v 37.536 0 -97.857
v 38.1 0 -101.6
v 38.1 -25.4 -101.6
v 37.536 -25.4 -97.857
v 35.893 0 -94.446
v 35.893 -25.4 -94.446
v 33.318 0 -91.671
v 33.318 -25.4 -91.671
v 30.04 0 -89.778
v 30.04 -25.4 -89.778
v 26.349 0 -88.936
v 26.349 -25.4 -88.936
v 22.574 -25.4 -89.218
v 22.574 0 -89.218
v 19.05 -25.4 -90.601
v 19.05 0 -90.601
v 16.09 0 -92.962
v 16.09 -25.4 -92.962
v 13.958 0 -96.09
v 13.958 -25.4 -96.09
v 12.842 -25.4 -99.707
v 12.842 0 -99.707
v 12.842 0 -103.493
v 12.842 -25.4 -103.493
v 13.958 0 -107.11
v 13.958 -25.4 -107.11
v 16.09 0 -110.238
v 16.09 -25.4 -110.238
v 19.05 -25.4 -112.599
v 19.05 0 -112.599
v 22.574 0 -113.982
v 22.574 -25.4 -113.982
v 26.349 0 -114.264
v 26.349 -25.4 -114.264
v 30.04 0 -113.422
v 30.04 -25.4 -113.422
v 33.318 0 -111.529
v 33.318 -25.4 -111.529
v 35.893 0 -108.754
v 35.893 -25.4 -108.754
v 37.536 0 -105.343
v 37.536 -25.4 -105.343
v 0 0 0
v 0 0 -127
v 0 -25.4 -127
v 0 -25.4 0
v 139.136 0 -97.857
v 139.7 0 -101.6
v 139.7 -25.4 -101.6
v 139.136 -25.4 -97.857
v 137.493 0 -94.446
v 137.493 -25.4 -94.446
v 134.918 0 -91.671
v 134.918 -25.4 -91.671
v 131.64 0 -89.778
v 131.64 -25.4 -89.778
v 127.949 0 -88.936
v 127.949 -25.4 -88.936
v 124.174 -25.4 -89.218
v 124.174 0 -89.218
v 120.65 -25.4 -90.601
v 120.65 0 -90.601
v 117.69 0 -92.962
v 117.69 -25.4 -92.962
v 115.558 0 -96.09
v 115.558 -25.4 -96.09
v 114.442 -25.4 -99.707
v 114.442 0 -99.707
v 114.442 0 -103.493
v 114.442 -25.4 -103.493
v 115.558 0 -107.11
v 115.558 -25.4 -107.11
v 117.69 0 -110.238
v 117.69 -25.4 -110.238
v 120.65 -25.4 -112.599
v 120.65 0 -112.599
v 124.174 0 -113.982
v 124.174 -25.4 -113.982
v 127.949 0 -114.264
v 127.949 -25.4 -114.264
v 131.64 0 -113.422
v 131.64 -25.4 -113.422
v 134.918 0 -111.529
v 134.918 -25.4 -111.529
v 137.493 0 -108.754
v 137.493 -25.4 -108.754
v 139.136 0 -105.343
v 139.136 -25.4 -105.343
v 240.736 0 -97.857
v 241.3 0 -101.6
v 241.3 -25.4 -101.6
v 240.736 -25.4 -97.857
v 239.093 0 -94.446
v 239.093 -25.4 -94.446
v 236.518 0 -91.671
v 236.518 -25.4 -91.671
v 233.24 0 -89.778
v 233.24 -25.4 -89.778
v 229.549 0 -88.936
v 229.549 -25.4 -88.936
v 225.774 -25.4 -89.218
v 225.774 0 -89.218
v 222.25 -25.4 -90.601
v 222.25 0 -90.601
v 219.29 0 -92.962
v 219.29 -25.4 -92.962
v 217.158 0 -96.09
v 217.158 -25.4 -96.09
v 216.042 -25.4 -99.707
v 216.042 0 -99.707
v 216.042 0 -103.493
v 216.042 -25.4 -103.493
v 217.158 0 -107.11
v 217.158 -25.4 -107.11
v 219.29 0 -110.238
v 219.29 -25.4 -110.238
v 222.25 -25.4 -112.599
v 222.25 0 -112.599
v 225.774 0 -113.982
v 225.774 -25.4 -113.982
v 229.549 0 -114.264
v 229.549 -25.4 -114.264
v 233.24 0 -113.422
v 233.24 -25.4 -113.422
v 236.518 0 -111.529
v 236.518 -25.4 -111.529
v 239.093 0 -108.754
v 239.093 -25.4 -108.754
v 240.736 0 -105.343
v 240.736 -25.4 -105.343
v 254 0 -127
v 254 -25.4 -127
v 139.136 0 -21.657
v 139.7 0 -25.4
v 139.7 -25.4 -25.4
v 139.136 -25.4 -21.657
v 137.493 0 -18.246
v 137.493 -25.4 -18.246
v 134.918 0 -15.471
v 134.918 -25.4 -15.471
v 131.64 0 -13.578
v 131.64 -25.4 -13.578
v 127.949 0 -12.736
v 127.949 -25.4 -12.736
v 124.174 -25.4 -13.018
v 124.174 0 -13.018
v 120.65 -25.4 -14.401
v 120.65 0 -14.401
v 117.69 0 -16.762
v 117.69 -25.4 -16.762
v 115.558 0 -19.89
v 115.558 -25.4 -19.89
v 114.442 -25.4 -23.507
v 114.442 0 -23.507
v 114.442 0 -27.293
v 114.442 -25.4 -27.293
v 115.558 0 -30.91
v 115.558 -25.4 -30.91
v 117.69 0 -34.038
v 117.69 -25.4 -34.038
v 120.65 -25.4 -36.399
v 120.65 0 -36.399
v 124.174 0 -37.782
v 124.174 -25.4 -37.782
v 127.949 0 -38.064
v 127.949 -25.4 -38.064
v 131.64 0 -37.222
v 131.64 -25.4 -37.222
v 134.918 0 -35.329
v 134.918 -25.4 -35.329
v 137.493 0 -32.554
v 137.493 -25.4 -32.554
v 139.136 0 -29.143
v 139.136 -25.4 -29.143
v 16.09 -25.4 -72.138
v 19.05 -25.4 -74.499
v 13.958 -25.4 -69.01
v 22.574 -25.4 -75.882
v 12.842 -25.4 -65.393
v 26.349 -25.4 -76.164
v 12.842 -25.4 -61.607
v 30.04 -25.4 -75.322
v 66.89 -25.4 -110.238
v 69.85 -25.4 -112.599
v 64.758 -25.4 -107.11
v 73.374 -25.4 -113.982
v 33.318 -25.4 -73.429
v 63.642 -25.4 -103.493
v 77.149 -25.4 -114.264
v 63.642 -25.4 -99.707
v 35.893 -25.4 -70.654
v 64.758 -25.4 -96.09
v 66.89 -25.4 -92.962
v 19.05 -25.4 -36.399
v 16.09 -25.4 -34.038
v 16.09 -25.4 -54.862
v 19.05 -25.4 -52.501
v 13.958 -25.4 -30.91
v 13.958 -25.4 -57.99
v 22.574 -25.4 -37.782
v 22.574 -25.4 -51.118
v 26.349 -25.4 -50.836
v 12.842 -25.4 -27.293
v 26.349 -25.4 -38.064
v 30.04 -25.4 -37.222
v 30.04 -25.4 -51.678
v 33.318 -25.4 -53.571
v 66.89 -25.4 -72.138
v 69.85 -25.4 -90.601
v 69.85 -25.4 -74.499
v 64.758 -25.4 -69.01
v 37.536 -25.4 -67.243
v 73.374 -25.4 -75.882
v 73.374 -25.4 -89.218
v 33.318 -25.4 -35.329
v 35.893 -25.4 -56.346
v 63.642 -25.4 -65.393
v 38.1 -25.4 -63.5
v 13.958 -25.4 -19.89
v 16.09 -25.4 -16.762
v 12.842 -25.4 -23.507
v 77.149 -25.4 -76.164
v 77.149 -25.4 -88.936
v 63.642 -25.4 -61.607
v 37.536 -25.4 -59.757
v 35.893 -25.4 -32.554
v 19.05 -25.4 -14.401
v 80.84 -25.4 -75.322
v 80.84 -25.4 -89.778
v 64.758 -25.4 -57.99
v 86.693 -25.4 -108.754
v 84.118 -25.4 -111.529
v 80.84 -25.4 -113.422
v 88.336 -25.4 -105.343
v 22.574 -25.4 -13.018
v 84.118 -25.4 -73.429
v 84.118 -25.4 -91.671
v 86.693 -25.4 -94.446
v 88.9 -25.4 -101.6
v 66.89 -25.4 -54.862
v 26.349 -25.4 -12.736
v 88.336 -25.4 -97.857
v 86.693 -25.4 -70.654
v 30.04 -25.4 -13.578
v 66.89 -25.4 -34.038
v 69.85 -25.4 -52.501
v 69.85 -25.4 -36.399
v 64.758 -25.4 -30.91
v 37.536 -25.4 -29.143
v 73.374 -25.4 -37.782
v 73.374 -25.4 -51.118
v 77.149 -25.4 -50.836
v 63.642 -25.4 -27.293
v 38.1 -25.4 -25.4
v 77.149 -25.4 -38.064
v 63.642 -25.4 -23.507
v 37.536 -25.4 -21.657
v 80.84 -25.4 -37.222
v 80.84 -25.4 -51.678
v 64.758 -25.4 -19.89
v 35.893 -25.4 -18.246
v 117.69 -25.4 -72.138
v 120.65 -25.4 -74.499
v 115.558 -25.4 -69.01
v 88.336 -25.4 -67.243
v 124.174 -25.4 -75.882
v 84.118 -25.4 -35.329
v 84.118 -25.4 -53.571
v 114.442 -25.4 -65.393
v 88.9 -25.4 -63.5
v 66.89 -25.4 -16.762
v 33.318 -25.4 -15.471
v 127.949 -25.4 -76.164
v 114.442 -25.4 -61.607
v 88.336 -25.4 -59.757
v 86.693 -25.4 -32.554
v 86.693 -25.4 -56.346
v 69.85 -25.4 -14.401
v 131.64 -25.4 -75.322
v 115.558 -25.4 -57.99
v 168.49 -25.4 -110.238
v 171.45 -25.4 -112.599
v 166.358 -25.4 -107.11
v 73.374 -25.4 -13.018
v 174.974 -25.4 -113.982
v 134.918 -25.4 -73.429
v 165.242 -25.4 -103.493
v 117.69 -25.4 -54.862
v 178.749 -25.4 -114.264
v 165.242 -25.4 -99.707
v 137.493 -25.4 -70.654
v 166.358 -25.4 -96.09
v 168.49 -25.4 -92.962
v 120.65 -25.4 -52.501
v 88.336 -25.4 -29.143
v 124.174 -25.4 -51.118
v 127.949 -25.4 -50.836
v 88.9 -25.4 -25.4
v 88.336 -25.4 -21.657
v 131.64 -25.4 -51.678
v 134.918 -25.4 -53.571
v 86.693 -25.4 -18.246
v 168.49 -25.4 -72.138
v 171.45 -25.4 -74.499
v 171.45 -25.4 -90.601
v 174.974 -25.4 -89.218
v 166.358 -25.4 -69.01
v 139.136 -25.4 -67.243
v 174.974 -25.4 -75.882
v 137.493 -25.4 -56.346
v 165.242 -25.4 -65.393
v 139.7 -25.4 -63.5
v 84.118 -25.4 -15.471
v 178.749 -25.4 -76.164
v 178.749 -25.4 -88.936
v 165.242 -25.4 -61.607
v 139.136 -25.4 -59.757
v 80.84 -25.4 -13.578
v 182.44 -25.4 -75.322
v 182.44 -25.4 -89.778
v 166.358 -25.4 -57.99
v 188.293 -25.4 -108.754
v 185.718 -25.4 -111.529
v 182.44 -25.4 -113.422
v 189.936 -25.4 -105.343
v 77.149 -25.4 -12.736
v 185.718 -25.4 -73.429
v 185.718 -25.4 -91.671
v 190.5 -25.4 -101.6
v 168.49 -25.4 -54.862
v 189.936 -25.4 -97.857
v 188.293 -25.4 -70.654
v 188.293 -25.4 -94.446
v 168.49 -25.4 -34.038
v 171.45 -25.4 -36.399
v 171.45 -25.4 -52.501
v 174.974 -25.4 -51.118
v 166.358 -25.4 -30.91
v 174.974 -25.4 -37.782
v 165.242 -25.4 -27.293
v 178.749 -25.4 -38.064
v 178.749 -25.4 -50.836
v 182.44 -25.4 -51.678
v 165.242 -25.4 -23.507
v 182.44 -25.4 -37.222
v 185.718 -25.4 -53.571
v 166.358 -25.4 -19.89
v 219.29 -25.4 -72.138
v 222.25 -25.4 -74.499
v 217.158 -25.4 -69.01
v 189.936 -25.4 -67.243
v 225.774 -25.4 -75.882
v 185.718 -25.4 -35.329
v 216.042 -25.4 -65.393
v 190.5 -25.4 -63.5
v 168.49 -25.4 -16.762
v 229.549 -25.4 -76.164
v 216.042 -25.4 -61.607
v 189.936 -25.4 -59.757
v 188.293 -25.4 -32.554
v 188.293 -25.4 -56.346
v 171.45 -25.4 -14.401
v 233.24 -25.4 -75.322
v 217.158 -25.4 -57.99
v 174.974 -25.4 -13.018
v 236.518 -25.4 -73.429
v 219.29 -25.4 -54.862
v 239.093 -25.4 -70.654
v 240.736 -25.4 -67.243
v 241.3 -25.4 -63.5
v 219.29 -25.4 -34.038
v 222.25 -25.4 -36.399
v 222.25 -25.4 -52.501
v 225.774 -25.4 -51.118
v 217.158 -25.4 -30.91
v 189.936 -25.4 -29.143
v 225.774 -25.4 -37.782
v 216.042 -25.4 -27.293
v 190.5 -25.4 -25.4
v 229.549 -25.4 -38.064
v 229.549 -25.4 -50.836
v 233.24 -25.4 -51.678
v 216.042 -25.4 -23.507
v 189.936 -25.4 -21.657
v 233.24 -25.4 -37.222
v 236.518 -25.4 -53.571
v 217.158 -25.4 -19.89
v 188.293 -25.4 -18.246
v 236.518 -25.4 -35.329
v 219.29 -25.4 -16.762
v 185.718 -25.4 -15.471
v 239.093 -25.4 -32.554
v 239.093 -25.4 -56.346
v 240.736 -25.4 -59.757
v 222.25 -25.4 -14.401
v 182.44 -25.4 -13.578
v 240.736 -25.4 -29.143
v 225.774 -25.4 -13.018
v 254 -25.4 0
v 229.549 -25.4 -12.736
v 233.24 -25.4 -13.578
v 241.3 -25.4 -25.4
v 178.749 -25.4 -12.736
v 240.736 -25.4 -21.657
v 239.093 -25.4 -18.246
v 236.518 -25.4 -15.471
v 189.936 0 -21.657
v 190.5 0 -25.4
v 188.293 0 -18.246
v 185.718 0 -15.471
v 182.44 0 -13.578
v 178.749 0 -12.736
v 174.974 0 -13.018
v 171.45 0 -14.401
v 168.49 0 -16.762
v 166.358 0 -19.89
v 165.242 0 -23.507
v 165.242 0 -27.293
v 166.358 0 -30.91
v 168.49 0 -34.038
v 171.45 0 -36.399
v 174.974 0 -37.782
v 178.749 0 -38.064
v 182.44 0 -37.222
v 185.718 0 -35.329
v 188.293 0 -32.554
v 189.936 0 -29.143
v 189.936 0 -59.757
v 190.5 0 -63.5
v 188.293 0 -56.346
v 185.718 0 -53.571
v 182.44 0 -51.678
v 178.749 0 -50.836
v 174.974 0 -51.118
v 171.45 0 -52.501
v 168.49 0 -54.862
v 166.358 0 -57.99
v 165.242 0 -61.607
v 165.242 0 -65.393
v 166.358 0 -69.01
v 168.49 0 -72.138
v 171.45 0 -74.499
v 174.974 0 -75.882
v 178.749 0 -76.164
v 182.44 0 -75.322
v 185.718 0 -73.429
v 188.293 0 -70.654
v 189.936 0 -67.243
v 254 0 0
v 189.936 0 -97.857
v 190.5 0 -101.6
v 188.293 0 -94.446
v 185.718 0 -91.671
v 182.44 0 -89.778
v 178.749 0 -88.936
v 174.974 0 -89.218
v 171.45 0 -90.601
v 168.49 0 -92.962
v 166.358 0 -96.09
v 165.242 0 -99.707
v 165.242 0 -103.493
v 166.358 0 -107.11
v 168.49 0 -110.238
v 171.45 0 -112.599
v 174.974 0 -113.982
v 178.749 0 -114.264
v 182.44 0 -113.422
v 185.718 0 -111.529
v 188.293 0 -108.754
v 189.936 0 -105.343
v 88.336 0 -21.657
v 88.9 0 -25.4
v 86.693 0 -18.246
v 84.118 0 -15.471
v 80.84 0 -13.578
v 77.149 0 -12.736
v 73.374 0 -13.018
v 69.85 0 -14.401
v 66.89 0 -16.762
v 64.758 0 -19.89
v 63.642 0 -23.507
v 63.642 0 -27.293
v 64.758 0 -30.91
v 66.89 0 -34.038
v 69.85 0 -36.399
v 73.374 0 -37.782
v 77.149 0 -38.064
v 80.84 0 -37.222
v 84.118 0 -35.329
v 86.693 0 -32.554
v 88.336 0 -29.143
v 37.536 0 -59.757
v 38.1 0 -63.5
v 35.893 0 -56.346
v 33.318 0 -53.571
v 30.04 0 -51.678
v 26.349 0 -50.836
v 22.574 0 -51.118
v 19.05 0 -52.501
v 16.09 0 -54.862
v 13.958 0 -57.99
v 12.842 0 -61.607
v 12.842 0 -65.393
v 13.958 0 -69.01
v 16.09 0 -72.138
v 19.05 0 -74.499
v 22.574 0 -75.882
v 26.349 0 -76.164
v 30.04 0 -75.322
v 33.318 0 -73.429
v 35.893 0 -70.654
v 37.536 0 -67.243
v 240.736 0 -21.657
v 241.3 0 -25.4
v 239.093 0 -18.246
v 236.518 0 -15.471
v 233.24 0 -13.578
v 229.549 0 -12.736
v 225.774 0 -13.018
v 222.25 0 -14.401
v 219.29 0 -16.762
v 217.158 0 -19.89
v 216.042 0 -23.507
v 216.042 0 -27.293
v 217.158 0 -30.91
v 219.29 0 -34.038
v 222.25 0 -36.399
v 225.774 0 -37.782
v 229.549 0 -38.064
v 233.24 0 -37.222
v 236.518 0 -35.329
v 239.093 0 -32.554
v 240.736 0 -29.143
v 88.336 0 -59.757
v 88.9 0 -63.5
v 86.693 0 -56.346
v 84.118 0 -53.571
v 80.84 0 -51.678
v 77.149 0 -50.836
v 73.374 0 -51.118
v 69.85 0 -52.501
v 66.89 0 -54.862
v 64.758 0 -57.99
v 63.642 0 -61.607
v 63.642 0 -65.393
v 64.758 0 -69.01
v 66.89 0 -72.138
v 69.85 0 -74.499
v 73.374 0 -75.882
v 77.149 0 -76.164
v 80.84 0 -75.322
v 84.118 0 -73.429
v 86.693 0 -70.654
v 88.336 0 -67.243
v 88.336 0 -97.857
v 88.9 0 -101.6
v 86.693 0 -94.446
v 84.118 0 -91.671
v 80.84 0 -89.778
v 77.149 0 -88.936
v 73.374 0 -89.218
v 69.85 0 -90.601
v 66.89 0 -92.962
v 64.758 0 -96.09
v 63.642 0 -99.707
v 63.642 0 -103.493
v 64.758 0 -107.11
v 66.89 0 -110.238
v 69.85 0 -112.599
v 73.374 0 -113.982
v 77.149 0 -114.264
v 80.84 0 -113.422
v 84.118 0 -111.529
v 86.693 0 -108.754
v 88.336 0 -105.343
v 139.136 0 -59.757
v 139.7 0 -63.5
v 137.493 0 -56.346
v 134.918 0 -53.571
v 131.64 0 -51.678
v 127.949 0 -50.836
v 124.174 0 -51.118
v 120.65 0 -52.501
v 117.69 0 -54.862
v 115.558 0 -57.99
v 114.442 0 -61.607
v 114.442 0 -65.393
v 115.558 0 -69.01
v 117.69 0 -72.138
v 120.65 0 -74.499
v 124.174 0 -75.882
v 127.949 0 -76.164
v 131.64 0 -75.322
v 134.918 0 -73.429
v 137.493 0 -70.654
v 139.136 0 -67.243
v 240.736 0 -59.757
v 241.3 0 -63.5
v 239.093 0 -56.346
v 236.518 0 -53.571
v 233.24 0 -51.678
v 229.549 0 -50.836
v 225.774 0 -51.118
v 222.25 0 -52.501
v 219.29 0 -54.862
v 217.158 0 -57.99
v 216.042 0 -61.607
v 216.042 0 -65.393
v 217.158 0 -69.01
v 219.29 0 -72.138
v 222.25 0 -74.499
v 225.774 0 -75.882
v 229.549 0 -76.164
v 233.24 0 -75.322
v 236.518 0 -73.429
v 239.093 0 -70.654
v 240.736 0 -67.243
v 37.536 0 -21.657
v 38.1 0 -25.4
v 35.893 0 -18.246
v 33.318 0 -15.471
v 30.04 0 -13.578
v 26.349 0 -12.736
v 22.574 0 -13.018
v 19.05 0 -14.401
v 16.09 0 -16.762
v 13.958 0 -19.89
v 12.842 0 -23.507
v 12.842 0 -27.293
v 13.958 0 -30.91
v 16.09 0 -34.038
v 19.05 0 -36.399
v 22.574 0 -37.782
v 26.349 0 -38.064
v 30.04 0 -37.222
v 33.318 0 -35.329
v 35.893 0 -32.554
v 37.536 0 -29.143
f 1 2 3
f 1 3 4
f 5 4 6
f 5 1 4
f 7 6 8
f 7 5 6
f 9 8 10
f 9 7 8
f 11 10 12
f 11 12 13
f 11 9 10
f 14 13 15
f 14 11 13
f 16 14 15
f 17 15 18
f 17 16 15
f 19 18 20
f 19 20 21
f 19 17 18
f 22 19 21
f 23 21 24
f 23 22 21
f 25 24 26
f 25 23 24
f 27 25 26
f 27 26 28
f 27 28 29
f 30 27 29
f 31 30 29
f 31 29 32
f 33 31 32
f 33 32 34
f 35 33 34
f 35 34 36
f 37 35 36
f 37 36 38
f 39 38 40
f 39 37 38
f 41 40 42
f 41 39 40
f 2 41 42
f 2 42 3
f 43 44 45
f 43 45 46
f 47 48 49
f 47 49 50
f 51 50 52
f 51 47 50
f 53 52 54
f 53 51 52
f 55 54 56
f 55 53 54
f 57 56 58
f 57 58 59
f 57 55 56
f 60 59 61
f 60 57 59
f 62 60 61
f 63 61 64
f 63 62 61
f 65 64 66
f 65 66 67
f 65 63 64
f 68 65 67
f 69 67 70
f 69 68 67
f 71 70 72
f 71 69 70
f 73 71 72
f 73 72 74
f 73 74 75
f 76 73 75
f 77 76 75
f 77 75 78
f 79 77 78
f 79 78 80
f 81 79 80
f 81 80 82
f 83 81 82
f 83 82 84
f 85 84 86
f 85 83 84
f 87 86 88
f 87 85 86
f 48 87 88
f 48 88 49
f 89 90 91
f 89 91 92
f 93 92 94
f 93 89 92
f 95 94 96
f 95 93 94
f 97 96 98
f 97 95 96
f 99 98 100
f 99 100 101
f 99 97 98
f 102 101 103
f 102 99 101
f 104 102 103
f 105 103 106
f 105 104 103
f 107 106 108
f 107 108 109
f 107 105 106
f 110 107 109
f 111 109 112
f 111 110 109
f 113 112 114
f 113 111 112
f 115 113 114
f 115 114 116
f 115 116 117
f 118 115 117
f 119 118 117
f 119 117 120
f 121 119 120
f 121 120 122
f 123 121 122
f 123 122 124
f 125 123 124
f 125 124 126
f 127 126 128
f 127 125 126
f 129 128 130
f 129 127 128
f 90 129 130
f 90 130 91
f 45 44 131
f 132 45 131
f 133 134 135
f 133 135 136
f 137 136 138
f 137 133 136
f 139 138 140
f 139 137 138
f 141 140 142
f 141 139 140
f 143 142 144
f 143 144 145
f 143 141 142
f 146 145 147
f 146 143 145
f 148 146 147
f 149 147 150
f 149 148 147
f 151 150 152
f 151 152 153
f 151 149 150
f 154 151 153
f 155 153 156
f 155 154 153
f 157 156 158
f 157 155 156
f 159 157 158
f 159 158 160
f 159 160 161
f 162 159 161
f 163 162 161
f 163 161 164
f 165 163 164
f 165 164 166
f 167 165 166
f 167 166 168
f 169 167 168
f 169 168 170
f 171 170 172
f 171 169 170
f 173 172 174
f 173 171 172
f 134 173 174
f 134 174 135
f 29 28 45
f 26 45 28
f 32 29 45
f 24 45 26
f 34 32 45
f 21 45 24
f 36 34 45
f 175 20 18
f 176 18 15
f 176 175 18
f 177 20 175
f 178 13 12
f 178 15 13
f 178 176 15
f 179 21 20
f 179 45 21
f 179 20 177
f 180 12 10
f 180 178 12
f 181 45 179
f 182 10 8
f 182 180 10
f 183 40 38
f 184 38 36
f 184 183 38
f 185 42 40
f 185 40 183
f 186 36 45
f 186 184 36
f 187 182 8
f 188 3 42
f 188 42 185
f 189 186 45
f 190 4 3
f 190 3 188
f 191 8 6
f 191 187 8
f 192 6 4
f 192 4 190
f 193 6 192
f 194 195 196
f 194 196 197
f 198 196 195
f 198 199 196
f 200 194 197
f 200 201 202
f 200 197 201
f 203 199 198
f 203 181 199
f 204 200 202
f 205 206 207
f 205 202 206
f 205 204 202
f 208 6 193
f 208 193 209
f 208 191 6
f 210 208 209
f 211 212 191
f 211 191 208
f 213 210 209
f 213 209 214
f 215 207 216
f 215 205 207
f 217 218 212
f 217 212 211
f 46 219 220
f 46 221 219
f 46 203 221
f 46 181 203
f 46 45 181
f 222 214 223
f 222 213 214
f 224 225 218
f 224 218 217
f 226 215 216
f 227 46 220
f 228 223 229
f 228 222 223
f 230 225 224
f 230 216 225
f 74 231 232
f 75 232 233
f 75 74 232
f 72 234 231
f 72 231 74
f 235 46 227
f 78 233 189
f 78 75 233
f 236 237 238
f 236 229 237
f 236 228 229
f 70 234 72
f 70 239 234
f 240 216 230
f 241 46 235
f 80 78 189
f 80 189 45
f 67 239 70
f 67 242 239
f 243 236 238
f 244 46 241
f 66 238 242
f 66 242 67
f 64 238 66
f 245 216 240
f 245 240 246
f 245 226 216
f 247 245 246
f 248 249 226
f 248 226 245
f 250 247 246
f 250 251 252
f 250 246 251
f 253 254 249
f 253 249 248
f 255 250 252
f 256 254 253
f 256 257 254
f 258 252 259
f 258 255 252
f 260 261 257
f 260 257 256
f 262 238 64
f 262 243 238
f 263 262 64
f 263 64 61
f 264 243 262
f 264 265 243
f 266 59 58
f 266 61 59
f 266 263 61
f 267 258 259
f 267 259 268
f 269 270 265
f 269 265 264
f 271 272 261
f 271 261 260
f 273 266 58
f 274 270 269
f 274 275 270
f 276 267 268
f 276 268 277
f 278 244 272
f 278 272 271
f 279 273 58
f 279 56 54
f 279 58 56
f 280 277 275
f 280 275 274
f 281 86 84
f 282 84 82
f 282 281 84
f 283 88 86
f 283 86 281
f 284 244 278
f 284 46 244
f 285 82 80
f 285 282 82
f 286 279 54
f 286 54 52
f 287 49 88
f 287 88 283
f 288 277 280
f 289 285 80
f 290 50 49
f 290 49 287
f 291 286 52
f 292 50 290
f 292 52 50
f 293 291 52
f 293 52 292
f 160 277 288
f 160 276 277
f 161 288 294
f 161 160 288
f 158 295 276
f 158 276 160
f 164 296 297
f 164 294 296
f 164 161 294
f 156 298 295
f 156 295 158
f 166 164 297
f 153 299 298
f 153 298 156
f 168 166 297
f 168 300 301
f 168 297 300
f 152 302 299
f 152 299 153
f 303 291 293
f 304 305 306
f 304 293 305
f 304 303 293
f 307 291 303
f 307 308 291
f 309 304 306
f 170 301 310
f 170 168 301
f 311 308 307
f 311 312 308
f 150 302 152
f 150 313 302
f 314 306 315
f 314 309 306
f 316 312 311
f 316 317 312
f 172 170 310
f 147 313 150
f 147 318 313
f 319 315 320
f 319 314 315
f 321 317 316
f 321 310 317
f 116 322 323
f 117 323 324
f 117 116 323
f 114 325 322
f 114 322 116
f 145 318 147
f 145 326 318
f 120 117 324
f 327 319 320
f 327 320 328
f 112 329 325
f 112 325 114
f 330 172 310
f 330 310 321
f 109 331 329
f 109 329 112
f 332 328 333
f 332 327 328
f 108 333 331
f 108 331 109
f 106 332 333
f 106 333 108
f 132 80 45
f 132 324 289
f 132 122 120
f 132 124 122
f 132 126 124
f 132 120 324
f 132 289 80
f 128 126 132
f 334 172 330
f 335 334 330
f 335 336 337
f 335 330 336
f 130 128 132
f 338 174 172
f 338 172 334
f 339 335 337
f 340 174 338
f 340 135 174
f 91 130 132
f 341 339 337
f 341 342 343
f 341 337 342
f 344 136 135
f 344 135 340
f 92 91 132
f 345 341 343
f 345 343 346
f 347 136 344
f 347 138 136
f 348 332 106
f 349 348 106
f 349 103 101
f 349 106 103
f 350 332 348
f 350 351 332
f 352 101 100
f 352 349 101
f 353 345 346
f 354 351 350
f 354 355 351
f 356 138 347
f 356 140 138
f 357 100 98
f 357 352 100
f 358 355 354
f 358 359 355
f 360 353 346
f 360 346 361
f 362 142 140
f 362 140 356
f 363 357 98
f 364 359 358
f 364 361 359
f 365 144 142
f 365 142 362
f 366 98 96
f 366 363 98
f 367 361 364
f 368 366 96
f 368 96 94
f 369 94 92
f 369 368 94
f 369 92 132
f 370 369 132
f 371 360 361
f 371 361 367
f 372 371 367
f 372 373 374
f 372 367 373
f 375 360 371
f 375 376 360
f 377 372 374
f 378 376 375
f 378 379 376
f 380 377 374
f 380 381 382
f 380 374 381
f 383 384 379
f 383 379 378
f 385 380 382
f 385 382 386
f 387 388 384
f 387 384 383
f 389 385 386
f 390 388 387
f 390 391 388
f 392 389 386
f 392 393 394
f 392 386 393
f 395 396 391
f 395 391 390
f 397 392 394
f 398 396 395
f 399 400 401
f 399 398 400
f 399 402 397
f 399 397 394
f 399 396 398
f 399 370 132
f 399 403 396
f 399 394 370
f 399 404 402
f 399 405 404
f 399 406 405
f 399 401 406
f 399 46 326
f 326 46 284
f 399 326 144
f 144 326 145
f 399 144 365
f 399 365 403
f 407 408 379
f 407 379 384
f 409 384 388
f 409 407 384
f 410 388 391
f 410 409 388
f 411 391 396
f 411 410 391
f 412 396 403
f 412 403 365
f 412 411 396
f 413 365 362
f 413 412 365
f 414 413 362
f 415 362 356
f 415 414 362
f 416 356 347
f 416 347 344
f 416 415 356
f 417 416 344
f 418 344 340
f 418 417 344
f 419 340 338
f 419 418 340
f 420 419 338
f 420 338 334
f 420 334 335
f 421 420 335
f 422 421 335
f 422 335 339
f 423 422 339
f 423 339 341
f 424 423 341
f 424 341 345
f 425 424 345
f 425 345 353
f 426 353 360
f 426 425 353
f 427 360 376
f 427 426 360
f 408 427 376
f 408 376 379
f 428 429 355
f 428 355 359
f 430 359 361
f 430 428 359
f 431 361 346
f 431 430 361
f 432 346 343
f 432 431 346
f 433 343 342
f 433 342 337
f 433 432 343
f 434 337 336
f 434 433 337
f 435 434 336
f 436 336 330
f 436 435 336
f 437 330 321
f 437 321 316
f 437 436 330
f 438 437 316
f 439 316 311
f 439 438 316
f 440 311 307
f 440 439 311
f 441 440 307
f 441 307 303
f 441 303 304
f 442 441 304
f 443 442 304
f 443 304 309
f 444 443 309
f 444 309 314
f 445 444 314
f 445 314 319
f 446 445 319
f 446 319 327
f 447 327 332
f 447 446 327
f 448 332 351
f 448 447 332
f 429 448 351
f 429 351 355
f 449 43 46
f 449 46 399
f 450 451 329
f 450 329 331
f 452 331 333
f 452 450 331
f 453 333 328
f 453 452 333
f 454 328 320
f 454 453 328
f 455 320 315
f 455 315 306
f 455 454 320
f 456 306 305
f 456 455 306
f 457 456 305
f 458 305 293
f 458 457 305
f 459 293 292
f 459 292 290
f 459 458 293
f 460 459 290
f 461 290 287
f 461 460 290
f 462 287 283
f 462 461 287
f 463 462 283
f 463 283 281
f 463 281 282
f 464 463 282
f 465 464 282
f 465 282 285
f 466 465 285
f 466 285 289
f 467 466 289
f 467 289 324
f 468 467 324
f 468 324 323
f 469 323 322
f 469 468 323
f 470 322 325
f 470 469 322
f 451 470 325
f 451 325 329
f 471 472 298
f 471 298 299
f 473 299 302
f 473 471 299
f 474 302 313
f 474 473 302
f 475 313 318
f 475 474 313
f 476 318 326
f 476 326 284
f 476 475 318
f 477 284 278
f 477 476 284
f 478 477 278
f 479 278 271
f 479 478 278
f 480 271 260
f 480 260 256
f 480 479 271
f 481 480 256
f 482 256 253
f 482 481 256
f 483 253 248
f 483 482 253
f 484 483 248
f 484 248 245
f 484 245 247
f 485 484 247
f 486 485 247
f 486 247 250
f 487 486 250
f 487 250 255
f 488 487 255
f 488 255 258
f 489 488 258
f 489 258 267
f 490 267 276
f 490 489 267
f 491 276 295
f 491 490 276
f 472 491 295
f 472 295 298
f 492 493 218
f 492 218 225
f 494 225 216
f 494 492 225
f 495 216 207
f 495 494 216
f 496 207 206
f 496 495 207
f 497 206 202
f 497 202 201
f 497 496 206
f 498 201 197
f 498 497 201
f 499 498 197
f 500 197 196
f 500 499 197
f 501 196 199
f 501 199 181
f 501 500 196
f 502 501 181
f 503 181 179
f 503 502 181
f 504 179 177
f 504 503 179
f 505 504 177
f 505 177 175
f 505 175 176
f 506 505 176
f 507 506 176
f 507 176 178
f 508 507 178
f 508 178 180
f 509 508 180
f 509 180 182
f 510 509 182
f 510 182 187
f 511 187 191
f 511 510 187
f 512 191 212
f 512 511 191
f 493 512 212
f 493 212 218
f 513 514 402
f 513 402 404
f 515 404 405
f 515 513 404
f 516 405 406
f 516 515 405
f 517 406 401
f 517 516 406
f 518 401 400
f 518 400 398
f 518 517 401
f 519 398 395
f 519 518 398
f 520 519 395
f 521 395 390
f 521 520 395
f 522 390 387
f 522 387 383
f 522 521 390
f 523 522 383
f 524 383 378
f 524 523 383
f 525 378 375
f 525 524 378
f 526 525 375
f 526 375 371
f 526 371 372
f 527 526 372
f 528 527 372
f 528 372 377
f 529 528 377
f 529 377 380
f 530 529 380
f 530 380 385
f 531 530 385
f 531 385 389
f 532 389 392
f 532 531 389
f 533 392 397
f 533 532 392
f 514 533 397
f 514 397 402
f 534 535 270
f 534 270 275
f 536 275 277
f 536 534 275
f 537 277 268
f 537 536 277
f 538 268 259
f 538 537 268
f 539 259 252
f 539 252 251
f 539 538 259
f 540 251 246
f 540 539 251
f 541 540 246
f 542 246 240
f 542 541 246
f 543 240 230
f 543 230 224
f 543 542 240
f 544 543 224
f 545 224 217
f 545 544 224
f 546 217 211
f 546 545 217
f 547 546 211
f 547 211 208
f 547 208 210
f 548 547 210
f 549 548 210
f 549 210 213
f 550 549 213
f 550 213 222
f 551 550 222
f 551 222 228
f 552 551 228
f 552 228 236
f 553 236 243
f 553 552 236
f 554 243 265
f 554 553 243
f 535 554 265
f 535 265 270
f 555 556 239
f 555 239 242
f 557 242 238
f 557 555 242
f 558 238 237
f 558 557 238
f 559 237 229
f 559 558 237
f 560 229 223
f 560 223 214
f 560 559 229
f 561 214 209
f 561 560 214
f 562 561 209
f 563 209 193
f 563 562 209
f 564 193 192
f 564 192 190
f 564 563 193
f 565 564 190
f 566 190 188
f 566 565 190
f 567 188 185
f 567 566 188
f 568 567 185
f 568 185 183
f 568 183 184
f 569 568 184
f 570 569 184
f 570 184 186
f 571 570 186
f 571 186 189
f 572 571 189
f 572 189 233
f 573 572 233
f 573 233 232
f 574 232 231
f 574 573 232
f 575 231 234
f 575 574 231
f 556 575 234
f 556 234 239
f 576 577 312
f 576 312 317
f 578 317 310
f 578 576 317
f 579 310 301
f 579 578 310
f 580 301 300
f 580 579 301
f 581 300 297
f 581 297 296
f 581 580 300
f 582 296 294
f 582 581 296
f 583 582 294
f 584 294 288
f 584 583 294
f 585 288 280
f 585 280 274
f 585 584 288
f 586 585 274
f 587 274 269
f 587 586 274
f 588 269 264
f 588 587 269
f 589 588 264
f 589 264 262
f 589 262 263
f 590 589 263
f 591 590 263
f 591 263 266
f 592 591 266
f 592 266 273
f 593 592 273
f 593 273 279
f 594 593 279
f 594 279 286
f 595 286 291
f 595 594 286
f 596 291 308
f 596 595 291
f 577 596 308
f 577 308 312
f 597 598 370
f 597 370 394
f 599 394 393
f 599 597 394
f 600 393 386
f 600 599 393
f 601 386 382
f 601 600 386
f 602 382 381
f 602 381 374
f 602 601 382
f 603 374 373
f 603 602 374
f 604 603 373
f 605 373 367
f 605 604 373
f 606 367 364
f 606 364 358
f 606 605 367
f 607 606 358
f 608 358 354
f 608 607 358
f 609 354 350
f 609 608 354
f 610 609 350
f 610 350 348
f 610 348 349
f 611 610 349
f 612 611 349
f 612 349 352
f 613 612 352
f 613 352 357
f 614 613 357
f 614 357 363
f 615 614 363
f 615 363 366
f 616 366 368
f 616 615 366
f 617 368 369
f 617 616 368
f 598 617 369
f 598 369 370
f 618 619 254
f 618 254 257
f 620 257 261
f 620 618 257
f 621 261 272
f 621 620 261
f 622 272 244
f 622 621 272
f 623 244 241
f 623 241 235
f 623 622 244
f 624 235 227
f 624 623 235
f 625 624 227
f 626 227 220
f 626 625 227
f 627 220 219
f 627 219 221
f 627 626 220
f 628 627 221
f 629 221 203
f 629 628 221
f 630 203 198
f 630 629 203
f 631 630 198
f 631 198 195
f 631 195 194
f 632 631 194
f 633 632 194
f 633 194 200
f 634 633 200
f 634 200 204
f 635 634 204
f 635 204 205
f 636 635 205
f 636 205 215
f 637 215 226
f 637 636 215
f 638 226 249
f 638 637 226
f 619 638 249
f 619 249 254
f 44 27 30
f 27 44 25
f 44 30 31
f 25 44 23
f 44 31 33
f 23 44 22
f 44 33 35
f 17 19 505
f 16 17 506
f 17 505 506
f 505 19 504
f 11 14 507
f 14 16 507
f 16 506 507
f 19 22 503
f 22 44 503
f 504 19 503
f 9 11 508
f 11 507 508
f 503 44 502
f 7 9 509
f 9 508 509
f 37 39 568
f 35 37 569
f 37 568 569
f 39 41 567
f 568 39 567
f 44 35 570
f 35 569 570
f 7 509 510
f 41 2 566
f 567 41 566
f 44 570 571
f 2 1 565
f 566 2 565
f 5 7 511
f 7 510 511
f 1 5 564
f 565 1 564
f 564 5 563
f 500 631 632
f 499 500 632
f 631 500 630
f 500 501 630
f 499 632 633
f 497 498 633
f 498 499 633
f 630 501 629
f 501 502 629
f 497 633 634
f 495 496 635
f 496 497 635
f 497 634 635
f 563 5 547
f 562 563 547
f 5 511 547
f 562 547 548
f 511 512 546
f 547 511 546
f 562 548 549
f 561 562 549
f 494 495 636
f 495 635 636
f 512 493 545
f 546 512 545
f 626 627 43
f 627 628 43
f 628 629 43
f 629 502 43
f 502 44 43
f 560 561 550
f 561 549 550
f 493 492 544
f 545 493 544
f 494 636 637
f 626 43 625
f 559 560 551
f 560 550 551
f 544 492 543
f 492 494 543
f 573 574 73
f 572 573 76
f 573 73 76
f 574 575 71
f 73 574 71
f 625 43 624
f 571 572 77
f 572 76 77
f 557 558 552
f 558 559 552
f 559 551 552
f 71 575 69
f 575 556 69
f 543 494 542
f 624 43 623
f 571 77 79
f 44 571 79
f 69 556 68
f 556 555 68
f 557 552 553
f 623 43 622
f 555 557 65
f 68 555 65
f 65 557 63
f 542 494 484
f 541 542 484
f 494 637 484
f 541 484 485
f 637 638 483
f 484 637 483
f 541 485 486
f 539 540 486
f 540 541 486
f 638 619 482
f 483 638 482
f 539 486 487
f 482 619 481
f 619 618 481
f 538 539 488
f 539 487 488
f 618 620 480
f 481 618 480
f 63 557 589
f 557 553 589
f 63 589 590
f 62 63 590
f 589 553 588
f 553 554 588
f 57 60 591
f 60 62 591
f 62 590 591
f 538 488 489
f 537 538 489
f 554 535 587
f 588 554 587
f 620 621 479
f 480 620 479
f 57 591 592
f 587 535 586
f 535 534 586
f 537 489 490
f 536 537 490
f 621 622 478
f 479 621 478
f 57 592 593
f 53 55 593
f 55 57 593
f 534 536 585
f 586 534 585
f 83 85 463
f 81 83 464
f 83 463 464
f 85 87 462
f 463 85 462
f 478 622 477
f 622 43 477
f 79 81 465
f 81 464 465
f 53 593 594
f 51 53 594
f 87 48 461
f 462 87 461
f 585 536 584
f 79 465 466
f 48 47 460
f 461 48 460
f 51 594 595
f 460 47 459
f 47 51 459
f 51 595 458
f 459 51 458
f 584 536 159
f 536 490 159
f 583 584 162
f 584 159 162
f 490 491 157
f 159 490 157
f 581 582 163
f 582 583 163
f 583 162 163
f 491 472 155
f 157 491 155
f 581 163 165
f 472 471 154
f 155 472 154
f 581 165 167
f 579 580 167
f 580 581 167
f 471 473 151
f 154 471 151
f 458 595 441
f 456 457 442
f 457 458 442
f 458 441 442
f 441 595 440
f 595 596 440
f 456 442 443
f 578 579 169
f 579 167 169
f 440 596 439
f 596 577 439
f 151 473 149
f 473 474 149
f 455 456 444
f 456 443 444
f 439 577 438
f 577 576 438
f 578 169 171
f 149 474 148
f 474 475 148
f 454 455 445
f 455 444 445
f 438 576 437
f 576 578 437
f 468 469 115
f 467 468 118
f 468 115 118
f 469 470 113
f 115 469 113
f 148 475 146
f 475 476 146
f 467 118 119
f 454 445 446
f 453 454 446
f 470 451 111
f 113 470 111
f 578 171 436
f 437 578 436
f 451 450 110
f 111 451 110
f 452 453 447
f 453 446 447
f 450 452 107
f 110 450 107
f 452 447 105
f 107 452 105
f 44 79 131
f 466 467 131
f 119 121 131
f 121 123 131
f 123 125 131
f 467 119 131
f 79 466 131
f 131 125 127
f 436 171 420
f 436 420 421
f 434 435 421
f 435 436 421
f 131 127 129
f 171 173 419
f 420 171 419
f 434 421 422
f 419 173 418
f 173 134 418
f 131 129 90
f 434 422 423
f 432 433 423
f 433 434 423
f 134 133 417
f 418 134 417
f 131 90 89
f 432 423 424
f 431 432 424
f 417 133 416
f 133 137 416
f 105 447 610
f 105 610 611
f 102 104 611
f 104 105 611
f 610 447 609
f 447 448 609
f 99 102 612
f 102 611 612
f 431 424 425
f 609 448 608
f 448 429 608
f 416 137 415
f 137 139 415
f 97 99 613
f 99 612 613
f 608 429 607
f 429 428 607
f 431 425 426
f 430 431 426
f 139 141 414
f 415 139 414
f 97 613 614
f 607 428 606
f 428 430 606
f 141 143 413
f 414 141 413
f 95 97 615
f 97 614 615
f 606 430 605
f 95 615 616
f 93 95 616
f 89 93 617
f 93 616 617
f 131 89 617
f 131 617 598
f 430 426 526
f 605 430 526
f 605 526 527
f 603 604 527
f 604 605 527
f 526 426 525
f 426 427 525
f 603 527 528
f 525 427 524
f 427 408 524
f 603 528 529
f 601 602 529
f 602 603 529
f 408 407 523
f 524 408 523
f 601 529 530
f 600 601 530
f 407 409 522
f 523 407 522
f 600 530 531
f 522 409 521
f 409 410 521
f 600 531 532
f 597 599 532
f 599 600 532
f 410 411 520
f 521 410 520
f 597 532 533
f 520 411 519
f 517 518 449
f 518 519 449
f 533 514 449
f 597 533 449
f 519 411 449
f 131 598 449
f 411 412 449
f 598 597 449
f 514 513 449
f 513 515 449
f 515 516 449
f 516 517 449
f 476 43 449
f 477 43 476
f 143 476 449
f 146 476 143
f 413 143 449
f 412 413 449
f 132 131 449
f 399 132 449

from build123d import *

# Parameters (mm, degrees)
F0_W     = 254
F0_H     = 127
F0_R     = 12.7
F1_DEPTH = 25.4


with BuildPart() as f1:
    # F0 (on Front) → F1 (new body)
    with BuildSketch(Plane.XZ):
        with Locations((127, -63.5)):
            Rectangle(F0_W, F0_H)
        with Locations((25.4, -101.6)):
            Circle(F0_R, mode=Mode.SUBTRACT)
        with Locations((76.2, -101.6)):
            Circle(F0_R, mode=Mode.SUBTRACT)
        with Locations((127, -101.6)):
            Circle(F0_R, mode=Mode.SUBTRACT)
        with Locations((177.8, -101.6)):
            Circle(F0_R, mode=Mode.SUBTRACT)
        with Locations((228.6, -101.6)):
            Circle(F0_R, mode=Mode.SUBTRACT)
        with Locations((25.4, -63.5)):
            Circle(F0_R, mode=Mode.SUBTRACT)
        with Locations((76.2, -63.5)):
            Circle(F0_R, mode=Mode.SUBTRACT)
        with Locations((25.4, -25.4)):
            Circle(F0_R, mode=Mode.SUBTRACT)
        with Locations((76.2, -25.4)):
            Circle(F0_R, mode=Mode.SUBTRACT)
        with Locations((127, -63.5)):
            Circle(F0_R, mode=Mode.SUBTRACT)
        with Locations((177.8, -63.5)):
            Circle(F0_R, mode=Mode.SUBTRACT)
        with Locations((228.6, -63.5)):
            Circle(F0_R, mode=Mode.SUBTRACT)
        with Locations((127, -25.4)):
            Circle(F0_R, mode=Mode.SUBTRACT)
        with Locations((177.8, -25.4)):
            Circle(F0_R, mode=Mode.SUBTRACT)
        with Locations((228.6, -25.4)):
            Circle(F0_R, mode=Mode.SUBTRACT)
    extrude(amount=F1_DEPTH)


solid = f1.part
